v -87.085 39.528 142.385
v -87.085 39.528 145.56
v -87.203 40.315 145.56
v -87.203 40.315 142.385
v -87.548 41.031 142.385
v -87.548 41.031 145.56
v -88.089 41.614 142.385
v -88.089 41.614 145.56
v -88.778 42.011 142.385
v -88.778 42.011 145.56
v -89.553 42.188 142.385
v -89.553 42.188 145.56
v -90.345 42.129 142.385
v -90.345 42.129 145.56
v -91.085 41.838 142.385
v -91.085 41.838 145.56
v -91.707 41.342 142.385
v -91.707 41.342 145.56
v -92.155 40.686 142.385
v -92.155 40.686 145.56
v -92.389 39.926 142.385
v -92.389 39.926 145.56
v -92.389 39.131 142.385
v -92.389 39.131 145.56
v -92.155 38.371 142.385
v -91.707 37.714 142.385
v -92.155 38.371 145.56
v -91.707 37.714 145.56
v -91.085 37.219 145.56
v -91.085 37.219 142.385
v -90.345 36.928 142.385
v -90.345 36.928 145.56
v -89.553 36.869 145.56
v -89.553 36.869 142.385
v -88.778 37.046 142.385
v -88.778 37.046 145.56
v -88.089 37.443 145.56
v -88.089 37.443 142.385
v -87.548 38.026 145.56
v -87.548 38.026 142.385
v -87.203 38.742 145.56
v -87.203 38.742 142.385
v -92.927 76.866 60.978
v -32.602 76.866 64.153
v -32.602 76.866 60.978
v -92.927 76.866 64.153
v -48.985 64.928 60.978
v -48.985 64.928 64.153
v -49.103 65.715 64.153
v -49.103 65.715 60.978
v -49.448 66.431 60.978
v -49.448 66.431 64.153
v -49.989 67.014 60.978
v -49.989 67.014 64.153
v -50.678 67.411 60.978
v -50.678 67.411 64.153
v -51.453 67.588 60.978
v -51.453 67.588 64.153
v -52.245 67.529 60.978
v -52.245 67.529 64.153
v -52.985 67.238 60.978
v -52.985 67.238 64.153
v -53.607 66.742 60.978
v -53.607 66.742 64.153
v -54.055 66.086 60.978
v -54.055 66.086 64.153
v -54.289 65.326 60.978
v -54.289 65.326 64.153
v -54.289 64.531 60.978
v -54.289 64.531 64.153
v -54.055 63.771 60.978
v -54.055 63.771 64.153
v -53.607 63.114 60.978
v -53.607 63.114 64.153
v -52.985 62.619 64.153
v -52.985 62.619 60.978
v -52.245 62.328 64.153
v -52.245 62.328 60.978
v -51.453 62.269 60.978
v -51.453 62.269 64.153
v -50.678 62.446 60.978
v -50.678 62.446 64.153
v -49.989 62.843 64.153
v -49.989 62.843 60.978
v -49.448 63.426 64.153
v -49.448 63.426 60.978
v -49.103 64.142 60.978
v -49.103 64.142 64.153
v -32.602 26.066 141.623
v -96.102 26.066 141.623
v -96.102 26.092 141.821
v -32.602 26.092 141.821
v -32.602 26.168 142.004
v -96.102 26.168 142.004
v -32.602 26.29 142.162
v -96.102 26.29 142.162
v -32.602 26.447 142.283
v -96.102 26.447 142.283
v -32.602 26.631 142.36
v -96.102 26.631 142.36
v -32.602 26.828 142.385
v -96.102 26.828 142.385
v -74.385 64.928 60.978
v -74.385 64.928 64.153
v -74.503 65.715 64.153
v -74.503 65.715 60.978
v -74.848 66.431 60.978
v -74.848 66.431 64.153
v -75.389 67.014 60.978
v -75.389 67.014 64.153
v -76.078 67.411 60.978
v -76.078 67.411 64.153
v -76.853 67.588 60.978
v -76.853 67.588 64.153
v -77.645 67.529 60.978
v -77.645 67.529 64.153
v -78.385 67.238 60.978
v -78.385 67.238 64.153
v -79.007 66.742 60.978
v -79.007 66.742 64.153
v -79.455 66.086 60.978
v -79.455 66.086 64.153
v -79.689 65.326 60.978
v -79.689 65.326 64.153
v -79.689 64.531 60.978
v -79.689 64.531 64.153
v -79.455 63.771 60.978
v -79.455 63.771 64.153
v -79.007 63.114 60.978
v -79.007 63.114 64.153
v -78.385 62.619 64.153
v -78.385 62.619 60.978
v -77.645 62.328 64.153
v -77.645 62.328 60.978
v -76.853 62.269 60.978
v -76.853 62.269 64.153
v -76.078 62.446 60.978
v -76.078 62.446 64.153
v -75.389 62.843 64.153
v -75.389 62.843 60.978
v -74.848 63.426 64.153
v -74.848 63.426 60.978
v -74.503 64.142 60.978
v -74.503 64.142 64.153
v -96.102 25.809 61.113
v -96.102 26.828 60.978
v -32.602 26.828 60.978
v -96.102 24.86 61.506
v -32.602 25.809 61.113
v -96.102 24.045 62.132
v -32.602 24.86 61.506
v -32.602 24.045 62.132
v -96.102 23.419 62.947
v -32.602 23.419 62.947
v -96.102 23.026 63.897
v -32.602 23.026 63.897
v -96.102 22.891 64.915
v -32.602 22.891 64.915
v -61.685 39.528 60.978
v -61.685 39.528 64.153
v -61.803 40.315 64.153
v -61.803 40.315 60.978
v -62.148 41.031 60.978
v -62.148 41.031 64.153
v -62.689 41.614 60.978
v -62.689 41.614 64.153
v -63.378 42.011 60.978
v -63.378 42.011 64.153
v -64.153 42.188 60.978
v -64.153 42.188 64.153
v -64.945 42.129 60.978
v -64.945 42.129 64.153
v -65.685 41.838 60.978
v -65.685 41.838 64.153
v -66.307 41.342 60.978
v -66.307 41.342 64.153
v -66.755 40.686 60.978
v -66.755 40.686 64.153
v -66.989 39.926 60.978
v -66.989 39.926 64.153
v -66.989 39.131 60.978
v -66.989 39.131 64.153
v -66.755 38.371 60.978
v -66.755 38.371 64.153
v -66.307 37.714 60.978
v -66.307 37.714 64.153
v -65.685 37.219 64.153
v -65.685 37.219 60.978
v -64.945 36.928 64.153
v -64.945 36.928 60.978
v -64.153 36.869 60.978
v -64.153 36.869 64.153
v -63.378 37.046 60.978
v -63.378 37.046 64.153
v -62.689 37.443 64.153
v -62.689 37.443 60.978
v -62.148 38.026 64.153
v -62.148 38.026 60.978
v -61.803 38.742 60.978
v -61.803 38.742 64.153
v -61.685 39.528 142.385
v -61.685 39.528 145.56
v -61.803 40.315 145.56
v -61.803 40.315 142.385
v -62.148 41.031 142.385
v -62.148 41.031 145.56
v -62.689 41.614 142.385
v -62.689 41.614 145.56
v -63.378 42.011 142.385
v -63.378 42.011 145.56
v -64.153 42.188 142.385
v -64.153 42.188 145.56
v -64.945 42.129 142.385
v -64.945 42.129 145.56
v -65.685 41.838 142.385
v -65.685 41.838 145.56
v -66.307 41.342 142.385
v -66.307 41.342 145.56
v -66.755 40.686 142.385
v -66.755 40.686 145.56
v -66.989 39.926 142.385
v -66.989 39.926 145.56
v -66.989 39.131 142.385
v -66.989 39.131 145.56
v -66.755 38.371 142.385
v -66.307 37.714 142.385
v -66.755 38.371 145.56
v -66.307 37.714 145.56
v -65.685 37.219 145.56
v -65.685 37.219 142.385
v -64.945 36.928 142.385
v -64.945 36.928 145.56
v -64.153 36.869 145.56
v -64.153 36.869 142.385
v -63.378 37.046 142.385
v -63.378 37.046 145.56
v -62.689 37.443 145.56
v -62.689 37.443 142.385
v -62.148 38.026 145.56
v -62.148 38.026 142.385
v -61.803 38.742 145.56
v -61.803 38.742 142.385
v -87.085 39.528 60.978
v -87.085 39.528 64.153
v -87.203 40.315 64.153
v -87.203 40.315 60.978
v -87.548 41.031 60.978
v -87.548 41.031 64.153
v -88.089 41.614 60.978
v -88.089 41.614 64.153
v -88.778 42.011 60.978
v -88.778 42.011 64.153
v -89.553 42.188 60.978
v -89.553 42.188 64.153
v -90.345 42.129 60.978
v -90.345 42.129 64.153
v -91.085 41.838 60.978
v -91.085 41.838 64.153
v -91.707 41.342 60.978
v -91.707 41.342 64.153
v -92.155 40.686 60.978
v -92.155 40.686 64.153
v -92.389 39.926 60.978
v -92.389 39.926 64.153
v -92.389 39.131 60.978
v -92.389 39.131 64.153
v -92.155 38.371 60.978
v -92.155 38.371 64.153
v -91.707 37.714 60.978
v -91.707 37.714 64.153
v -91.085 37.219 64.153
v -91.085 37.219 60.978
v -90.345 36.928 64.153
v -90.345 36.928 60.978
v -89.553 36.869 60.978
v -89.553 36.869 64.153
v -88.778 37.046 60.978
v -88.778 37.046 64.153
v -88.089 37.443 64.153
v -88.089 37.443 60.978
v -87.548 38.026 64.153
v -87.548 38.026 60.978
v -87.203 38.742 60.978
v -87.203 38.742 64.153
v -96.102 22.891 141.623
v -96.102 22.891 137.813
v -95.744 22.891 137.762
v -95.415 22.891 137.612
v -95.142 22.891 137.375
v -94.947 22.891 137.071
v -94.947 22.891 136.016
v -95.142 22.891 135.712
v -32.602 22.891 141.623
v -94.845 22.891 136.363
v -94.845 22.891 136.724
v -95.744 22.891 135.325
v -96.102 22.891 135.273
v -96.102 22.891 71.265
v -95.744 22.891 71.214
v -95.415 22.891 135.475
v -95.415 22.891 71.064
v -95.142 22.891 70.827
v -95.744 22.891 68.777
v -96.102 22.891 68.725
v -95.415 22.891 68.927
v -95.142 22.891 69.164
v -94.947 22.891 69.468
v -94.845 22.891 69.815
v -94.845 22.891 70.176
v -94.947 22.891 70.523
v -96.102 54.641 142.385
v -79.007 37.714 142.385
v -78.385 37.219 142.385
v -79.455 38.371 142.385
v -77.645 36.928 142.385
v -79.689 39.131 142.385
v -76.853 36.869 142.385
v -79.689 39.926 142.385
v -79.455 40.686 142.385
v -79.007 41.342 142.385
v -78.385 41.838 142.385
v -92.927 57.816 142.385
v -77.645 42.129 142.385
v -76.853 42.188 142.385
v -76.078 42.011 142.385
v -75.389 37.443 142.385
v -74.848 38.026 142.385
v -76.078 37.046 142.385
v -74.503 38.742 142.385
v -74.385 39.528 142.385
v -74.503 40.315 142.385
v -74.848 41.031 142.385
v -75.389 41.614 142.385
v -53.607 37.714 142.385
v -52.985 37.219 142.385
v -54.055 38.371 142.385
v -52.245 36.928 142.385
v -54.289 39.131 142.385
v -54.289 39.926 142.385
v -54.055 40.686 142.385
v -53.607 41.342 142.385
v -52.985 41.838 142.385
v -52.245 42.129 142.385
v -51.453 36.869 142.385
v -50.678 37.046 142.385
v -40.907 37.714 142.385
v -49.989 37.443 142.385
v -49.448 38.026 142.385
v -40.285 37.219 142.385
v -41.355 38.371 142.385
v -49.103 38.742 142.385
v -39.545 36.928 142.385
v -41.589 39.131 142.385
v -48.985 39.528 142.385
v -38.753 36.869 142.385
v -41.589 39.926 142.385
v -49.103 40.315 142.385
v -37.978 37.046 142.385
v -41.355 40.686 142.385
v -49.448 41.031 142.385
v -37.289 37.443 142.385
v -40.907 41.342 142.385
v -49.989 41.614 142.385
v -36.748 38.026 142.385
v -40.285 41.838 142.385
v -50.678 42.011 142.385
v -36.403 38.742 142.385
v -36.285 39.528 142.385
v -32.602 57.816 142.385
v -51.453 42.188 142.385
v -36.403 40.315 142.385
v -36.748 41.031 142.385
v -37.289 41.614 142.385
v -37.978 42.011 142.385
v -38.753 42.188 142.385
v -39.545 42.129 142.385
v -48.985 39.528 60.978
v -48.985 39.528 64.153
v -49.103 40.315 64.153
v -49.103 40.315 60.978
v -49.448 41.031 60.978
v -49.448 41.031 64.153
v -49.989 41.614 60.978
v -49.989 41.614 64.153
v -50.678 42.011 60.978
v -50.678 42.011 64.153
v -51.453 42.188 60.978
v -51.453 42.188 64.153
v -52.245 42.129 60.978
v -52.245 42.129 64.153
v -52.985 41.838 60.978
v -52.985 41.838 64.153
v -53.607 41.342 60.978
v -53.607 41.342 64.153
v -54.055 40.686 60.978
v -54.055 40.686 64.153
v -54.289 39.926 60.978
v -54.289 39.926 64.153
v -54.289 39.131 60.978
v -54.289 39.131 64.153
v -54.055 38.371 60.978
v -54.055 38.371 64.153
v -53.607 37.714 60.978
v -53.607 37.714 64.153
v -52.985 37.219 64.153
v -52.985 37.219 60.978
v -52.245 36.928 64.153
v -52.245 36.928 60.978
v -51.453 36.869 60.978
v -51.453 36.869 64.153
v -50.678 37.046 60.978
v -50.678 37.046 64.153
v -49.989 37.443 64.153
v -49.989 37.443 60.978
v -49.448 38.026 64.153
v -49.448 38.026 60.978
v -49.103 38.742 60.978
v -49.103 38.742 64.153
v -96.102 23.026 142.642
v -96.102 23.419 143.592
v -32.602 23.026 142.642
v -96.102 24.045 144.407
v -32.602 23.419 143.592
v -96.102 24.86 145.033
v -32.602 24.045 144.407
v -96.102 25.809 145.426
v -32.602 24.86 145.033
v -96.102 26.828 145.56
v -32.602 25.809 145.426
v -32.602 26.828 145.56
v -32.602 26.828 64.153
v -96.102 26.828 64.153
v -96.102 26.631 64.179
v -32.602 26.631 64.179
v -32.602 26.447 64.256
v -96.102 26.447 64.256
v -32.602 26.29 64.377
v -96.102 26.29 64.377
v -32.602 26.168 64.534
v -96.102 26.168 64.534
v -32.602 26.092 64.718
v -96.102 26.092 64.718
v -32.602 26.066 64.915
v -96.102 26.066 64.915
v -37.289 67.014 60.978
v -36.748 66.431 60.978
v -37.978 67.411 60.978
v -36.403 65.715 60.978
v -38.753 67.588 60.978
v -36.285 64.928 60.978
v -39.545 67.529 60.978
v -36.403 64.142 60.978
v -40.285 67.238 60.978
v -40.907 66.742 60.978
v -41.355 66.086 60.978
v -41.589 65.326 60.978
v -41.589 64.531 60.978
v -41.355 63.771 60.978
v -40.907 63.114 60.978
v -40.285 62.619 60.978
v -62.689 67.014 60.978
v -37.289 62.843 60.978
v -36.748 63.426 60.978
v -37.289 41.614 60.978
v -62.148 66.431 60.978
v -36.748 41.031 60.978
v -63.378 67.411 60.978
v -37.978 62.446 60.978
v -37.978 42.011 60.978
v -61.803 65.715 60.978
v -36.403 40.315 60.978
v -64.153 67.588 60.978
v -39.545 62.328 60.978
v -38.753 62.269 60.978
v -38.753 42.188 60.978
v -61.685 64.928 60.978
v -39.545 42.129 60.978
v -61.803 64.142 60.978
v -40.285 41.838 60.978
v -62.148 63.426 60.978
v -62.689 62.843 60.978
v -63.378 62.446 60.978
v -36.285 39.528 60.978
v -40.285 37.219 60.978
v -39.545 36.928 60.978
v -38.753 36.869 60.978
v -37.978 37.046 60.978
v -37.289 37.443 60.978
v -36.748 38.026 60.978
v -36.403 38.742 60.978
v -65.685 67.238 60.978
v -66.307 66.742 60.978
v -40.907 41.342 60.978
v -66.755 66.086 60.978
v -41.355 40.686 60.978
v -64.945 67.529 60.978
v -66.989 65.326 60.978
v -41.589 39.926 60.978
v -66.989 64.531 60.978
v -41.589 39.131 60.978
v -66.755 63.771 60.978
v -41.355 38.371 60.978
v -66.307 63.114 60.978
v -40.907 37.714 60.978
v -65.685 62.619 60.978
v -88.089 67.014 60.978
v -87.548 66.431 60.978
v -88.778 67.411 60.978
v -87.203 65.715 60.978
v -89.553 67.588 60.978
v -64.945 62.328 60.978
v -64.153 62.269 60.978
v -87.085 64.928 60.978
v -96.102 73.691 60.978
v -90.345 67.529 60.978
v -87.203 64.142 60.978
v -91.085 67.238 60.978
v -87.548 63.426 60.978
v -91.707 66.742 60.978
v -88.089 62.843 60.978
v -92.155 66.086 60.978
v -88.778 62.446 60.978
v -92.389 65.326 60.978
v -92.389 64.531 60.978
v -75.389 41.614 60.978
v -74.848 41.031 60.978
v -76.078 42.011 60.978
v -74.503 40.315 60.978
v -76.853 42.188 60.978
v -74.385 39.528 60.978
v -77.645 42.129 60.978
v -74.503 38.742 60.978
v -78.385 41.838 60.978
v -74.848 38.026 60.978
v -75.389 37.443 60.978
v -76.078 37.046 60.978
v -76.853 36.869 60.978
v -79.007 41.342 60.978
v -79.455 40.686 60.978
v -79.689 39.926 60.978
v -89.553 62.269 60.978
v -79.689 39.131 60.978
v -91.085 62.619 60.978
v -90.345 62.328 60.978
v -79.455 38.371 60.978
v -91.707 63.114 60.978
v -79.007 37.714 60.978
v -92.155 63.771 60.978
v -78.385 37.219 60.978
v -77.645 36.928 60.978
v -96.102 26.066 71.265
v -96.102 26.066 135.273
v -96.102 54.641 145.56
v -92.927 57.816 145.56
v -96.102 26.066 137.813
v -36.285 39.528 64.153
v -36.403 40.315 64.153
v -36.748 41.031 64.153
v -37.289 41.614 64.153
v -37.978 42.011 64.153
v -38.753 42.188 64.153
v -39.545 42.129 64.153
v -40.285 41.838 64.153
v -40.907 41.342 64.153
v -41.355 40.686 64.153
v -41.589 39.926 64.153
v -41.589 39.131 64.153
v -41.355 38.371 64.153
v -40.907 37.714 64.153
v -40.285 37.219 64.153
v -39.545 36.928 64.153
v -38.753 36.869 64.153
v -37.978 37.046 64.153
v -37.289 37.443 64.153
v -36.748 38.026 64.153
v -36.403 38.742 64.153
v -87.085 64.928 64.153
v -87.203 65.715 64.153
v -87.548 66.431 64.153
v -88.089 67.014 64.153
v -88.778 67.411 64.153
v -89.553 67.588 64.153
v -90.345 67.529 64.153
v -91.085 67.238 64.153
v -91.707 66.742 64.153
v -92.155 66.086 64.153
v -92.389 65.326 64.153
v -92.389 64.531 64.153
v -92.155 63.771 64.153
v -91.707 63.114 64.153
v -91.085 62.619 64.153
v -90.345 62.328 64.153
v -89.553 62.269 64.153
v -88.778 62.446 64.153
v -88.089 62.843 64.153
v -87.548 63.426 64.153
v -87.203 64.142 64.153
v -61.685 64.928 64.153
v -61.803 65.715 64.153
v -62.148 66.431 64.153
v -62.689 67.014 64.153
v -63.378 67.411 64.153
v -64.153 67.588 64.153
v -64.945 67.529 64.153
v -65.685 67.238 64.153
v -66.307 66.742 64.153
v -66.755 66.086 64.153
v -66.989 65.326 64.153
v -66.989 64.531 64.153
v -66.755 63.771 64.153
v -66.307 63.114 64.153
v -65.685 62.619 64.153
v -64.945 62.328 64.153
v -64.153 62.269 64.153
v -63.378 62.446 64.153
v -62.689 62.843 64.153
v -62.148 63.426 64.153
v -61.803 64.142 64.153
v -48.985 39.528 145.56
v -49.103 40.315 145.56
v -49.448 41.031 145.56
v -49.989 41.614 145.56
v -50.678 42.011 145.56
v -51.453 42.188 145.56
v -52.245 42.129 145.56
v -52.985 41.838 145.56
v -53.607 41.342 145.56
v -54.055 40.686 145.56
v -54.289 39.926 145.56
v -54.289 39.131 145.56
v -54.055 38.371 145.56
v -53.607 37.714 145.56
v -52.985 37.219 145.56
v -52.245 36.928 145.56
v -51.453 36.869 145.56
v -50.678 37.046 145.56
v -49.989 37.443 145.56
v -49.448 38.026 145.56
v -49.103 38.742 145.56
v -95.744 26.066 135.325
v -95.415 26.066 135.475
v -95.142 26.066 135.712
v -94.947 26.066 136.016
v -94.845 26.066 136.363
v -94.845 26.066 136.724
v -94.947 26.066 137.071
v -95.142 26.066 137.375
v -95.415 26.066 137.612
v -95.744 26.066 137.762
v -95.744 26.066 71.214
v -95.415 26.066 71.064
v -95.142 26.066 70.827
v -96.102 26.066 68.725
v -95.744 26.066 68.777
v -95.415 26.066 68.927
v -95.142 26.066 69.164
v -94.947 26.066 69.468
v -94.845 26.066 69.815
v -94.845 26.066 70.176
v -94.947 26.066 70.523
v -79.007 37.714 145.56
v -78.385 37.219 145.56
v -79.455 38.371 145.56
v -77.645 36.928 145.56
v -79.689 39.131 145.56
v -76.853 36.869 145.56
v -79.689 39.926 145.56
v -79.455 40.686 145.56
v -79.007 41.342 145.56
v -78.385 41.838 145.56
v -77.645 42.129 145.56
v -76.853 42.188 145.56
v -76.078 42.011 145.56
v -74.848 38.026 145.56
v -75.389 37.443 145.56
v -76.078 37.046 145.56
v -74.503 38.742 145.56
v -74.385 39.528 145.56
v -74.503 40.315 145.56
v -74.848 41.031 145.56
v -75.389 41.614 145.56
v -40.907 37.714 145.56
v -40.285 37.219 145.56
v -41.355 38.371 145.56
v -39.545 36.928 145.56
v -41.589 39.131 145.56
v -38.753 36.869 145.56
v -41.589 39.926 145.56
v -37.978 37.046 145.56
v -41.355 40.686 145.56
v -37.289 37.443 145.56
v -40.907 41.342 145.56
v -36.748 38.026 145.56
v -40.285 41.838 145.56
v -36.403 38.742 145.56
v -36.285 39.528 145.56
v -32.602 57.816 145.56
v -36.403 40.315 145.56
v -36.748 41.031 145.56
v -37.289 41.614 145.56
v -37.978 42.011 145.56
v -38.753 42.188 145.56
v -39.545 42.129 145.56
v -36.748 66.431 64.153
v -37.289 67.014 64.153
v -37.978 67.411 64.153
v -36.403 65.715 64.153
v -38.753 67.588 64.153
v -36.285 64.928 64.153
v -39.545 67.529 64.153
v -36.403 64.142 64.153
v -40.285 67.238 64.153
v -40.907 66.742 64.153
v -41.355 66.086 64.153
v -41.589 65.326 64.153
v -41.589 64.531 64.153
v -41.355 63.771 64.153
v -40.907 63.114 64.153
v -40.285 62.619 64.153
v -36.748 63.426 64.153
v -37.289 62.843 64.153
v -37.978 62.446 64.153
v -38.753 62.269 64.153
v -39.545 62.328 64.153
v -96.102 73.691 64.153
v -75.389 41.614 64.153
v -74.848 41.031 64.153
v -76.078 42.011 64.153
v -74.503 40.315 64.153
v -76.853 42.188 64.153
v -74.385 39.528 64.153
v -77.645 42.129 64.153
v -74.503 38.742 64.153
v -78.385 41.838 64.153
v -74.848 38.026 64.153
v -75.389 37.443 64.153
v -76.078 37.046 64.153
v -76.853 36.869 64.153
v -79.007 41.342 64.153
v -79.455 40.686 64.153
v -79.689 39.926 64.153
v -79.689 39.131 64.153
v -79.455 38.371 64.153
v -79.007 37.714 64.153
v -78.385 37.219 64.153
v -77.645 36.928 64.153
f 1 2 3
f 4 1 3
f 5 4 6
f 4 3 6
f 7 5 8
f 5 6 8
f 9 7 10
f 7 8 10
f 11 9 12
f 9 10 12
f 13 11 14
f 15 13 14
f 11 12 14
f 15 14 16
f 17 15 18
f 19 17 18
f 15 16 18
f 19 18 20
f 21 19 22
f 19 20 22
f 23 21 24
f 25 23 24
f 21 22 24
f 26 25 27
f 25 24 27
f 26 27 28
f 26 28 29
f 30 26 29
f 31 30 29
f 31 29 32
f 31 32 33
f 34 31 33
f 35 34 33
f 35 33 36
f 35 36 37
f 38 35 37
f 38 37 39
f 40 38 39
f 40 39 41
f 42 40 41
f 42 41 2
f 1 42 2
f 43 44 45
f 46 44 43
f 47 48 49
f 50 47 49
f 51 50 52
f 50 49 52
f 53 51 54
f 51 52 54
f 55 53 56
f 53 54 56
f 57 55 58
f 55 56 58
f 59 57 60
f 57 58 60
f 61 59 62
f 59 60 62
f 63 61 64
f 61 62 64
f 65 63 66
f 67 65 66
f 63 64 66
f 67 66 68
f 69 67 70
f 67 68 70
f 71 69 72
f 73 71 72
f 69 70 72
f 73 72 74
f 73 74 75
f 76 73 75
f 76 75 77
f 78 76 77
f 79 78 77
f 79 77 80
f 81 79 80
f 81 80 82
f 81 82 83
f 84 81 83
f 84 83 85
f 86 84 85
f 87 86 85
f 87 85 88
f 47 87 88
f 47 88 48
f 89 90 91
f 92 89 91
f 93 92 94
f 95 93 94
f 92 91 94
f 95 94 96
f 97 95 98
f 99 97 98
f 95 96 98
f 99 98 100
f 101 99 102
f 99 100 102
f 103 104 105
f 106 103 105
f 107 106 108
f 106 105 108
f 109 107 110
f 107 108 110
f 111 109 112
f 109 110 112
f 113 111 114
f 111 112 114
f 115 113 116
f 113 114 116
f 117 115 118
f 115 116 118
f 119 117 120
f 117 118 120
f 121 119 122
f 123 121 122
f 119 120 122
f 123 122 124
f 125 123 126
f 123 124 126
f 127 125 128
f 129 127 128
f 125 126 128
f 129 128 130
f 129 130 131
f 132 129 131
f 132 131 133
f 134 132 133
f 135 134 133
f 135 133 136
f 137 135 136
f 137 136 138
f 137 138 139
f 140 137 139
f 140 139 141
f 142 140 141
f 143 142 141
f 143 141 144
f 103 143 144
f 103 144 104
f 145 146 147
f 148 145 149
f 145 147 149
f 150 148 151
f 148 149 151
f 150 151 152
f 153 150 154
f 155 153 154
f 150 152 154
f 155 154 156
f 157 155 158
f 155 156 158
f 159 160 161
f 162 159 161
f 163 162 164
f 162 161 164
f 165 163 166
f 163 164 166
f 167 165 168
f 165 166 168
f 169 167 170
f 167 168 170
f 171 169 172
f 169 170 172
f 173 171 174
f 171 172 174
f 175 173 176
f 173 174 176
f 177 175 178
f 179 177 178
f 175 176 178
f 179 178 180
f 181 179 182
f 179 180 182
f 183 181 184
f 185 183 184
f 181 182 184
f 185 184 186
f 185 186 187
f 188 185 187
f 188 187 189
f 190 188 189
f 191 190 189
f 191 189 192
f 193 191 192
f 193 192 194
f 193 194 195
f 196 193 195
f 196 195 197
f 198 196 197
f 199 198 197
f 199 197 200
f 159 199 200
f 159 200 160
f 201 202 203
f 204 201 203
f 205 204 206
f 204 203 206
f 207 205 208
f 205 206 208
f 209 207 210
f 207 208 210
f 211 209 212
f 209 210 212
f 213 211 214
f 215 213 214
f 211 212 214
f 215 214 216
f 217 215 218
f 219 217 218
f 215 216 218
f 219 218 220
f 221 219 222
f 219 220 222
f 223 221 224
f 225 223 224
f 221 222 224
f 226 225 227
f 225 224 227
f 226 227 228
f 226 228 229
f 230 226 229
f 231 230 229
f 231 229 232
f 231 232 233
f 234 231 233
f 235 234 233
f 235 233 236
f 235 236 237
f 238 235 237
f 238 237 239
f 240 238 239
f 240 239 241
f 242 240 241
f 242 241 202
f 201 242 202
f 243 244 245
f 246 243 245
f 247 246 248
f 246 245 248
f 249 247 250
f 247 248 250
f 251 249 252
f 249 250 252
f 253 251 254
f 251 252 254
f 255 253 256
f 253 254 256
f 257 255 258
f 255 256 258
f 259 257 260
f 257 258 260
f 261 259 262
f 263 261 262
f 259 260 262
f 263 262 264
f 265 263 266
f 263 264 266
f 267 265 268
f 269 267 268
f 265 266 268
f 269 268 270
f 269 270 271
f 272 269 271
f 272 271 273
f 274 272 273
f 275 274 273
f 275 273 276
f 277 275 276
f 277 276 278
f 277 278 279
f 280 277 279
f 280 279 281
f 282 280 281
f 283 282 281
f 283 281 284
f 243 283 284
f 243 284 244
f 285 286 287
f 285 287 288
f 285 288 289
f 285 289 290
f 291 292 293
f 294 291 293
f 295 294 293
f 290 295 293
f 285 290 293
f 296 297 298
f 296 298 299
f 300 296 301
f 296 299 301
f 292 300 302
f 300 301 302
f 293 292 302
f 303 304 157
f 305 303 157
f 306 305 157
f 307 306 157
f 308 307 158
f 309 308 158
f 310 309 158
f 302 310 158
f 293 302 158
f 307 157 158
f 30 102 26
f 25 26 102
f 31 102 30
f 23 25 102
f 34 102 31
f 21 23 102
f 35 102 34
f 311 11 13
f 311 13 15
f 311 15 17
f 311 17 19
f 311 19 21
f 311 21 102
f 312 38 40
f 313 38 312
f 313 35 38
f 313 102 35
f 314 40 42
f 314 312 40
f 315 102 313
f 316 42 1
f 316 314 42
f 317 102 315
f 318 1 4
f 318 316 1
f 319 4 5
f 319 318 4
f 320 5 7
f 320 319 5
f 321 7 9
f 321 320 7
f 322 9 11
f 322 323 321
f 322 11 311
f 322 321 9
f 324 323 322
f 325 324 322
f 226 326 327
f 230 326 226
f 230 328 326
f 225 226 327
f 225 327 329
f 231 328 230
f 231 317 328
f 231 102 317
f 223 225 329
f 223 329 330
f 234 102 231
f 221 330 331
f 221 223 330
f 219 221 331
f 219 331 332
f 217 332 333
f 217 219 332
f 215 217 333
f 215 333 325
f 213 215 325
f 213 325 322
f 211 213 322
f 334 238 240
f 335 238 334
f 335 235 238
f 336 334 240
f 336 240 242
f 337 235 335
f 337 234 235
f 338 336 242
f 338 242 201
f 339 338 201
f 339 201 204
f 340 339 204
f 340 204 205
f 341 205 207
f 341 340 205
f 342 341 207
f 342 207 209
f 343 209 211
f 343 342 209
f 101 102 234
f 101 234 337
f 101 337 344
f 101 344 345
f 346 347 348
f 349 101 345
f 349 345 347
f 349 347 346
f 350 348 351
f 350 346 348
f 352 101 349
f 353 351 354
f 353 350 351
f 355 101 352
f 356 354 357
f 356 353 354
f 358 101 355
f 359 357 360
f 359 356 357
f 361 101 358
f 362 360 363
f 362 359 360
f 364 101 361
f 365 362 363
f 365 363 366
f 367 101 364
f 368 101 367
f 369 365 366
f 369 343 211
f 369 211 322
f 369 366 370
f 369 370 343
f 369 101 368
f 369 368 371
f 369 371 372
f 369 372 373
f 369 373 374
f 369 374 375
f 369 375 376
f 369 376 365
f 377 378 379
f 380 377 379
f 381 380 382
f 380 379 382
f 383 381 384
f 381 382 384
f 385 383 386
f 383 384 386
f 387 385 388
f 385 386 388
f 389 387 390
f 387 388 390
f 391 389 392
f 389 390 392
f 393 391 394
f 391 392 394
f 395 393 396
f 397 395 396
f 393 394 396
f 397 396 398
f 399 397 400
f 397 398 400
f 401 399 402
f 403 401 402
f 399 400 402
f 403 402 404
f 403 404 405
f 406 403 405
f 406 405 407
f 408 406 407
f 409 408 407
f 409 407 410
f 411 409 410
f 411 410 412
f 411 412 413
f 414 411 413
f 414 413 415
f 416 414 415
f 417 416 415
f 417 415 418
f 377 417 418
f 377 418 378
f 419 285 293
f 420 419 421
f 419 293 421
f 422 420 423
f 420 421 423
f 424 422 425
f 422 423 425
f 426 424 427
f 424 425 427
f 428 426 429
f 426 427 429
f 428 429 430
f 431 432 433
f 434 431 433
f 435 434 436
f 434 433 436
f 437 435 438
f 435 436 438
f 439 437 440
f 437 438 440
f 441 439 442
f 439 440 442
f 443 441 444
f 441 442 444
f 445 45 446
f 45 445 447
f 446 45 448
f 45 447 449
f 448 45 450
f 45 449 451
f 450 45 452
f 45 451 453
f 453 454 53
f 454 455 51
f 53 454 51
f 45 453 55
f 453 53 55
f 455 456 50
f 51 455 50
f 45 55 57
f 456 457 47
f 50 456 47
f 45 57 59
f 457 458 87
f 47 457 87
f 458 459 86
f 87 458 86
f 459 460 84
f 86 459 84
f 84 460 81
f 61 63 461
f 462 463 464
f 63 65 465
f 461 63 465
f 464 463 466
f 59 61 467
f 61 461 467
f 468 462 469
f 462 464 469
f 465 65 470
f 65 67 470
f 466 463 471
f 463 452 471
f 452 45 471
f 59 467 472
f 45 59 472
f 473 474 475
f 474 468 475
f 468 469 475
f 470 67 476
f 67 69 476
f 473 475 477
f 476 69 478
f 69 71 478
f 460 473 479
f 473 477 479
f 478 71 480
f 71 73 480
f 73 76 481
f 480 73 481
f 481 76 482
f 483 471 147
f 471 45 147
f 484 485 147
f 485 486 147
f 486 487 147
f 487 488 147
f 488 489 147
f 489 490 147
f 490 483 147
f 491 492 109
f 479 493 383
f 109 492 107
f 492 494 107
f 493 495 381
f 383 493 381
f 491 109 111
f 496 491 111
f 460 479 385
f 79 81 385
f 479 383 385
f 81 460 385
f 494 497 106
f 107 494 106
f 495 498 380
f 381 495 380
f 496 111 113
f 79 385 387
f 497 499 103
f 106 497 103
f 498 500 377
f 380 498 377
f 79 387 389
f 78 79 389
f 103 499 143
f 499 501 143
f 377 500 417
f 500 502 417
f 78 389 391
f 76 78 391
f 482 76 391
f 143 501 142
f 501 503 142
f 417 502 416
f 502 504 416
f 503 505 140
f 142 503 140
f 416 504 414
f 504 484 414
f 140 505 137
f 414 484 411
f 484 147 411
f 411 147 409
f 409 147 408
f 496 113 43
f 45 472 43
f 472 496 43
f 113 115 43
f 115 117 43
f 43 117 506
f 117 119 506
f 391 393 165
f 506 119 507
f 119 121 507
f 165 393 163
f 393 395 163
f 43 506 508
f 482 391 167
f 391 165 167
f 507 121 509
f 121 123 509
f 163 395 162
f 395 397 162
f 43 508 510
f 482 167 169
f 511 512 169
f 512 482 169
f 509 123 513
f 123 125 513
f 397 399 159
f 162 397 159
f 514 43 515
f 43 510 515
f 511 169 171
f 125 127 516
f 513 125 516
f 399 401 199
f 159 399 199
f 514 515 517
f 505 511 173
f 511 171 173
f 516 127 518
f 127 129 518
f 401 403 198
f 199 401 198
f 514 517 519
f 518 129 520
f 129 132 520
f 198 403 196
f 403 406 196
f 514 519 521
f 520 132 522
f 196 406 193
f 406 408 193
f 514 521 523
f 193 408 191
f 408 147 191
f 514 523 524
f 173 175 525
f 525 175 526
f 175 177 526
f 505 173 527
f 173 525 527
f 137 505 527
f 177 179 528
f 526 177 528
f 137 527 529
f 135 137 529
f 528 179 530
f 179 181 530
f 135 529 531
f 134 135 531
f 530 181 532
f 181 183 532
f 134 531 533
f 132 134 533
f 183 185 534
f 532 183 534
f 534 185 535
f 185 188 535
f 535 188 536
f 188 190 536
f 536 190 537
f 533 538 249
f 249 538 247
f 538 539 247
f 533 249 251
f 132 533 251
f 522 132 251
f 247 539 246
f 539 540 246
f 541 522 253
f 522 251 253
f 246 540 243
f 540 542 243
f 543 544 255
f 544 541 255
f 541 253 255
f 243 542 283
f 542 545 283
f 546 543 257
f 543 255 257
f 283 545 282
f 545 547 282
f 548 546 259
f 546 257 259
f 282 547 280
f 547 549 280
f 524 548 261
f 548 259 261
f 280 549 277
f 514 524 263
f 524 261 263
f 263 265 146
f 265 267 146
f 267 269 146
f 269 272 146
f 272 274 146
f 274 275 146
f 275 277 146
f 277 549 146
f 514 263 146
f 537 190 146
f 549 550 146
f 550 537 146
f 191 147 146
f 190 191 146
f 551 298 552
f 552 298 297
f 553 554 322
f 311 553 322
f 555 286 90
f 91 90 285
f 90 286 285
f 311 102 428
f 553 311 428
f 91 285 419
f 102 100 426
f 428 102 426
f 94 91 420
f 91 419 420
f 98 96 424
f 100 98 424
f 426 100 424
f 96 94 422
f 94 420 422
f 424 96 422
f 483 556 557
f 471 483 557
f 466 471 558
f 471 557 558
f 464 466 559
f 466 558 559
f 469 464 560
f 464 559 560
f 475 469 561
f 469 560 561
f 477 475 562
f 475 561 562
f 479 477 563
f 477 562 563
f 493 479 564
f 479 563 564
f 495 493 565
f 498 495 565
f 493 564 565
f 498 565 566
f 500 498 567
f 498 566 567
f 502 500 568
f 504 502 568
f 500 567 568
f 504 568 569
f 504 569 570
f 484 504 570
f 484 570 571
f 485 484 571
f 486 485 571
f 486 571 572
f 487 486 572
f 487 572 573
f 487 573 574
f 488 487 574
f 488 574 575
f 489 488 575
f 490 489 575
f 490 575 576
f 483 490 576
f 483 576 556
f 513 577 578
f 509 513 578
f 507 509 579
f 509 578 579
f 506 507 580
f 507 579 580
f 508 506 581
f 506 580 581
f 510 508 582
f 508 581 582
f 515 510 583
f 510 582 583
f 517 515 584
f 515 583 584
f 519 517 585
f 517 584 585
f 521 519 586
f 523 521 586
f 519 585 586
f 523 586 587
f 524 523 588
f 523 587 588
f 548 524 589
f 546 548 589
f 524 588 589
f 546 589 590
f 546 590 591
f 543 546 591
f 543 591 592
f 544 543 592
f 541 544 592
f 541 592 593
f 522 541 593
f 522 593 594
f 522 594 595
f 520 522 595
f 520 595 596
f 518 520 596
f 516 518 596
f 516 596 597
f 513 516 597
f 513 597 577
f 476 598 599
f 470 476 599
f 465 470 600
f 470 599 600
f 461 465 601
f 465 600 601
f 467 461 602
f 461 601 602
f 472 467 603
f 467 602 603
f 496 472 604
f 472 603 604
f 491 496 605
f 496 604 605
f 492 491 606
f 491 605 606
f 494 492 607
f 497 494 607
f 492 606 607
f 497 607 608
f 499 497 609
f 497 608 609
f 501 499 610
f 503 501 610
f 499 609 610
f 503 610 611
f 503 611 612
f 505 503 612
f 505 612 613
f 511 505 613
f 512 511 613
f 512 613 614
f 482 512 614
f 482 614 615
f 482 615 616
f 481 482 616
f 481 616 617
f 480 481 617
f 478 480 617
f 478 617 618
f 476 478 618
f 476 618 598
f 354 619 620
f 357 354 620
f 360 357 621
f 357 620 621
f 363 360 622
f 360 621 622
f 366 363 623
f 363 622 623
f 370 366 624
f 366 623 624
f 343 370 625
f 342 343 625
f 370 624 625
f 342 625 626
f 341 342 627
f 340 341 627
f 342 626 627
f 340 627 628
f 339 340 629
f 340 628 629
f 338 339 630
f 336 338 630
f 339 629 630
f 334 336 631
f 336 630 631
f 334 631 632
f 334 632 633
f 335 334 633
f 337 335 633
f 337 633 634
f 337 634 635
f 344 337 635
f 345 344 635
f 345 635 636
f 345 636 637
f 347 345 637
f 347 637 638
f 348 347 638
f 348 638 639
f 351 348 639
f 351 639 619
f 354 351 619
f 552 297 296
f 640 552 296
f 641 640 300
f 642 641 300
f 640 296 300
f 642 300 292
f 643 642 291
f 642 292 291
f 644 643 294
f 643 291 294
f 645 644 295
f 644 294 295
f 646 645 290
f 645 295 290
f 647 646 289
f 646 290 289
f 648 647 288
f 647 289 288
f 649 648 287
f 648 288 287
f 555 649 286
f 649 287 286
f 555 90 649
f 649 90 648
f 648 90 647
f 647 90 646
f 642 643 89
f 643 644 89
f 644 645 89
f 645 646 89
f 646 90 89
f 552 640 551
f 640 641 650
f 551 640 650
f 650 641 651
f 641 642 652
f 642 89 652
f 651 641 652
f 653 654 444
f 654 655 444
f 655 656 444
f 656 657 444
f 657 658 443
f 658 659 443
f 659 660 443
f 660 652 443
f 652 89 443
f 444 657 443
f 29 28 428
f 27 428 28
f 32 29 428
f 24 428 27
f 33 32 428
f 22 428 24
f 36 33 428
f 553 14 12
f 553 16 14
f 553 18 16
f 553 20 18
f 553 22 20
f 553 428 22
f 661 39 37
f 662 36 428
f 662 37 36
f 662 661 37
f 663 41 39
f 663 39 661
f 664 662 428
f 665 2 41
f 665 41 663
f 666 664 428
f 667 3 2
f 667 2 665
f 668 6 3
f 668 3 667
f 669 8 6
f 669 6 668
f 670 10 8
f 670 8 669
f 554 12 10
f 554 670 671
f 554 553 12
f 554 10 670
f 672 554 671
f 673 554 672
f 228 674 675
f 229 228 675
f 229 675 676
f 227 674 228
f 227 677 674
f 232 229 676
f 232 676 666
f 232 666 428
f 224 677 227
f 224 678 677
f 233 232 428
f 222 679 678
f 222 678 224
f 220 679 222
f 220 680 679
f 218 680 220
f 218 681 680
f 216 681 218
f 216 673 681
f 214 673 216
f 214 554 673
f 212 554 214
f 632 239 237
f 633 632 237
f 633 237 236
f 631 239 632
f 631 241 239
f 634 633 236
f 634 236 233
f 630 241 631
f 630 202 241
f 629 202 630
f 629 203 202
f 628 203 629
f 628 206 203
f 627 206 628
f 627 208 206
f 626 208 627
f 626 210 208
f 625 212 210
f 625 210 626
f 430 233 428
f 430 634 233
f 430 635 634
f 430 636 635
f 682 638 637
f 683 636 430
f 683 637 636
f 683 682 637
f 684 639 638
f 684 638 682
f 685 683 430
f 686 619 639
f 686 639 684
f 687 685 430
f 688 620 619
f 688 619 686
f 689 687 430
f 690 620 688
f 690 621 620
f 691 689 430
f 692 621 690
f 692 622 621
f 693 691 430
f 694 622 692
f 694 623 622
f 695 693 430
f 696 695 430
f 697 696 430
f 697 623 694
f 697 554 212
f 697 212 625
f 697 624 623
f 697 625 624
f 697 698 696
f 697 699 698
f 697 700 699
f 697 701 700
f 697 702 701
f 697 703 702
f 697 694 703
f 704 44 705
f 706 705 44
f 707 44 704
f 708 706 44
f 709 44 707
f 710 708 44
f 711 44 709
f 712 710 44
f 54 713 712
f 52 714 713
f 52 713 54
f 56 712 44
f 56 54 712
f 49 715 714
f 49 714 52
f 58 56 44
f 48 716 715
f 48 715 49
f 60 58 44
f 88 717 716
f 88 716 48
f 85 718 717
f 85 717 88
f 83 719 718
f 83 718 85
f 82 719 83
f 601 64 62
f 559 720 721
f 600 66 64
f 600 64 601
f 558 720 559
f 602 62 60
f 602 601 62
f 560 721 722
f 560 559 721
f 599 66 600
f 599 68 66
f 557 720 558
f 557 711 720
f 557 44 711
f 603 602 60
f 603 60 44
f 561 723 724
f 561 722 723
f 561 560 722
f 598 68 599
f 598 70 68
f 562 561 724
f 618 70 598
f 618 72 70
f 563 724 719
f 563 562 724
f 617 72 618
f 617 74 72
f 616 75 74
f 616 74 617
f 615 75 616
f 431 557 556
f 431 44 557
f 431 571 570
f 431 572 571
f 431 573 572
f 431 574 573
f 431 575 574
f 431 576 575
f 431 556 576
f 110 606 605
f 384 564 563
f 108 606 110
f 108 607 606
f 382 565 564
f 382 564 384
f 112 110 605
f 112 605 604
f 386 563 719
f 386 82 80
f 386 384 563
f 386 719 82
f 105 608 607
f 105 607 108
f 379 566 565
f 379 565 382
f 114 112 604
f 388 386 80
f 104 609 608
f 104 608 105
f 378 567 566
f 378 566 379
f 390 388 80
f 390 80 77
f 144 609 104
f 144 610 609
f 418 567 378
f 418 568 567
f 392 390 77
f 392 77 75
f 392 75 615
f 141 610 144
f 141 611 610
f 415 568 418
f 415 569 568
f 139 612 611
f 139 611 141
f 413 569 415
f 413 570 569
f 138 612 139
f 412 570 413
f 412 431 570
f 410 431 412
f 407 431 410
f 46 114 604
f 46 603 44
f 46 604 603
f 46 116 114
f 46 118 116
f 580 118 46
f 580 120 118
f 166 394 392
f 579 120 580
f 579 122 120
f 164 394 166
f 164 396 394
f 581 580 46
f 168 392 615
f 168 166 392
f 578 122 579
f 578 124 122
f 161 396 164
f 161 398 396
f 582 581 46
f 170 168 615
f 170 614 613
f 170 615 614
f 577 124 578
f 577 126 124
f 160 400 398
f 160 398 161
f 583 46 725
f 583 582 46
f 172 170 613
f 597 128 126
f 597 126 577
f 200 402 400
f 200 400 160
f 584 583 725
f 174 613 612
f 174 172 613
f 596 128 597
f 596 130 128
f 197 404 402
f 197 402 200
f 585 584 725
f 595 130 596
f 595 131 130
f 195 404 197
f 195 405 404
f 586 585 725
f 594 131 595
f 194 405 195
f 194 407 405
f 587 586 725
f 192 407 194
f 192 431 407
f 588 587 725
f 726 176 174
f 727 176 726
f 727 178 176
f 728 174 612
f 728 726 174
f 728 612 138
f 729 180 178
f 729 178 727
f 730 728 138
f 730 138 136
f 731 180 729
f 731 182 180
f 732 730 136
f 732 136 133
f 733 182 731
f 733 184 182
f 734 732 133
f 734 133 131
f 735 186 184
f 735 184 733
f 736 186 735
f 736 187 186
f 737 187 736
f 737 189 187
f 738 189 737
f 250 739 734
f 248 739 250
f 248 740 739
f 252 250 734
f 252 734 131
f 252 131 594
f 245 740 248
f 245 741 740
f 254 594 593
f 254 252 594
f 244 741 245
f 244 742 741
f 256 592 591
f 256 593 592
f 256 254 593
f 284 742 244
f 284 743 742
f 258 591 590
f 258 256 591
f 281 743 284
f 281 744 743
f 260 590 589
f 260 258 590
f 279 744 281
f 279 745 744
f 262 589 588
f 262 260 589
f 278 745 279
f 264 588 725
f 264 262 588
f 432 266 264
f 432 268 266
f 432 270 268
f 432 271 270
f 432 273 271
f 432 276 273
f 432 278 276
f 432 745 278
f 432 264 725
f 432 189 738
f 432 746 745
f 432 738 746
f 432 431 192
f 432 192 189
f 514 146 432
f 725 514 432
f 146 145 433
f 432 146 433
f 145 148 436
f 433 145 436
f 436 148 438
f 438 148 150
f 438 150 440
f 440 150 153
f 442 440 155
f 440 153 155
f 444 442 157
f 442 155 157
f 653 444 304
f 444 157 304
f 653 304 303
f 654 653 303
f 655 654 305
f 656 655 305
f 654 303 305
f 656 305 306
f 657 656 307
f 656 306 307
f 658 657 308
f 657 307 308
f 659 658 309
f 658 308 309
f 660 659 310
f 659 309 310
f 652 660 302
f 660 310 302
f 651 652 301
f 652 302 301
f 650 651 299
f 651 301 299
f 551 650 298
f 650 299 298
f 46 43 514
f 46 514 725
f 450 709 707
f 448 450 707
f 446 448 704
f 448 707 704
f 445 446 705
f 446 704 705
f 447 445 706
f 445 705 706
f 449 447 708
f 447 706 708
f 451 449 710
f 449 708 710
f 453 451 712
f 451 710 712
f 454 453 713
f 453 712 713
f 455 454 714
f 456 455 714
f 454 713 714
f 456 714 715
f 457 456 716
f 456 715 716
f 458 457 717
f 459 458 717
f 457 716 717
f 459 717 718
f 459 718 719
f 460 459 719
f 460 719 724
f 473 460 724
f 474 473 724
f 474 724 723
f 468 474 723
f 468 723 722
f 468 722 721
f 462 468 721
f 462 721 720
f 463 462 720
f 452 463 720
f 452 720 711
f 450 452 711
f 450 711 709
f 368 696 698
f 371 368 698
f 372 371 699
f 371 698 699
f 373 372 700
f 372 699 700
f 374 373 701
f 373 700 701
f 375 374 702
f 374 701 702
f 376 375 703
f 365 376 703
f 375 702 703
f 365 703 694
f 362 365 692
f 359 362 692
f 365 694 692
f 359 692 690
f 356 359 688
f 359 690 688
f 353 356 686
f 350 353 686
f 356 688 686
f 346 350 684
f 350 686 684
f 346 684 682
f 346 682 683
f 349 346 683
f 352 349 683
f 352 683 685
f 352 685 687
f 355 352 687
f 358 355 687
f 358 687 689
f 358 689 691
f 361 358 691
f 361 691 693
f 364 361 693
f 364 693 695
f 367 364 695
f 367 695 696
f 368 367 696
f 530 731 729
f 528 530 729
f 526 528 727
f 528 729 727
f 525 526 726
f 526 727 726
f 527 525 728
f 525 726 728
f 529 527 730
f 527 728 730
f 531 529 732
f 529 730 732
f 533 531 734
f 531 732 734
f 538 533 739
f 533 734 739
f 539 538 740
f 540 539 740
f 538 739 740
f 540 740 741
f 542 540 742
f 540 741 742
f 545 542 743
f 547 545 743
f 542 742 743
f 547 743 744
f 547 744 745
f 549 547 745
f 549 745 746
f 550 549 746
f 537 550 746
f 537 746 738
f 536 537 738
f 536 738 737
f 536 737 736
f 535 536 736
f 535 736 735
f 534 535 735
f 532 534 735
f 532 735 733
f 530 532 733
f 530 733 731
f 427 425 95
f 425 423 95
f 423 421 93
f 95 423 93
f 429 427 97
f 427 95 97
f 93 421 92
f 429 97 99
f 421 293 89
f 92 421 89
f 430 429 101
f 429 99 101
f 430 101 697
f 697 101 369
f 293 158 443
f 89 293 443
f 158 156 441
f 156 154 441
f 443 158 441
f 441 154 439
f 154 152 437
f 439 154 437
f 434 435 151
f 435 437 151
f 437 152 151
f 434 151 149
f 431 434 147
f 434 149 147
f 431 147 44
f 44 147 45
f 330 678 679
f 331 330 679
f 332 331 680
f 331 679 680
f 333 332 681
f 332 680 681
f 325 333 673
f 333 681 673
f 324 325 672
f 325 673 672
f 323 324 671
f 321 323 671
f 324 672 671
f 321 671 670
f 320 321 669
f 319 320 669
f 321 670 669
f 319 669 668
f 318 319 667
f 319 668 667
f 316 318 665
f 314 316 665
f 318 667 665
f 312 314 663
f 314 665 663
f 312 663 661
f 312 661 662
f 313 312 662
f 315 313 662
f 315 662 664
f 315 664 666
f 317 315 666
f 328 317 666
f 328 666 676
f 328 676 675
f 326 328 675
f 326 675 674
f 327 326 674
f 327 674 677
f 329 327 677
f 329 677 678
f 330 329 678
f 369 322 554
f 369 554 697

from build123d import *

# Parameters (mm, degrees)
SKETCH1_W            = 698.5
SKETCH1_H            = 84.582
BOSS_EXTRUDE1_DEPTH  = 34.925
SKETCH2_W            = 81.407
SKETCH2_H            = 31.75
CUT_EXTRUDE1_DEPTH   = 699.5
SKETCH3_W            = 698.5
SKETCH3_H            = 3.175
BOSS_EXTRUDE2_DEPTH  = 50.8
M2_CLEARANCE_HOLE1_D = 2.54
M5_CLEARANCE_HOLE1_D = 5.334
CHAMFER1_SIZE        = 3.175
FILLET1_R            = 0.762
FILLET2_R            = 3.937
SKETCH8_W            = 725.924928317
SKETCH8_H            = 218.216354959
CUT_EXTRUDE2_DEPTH   = 85.582


with BuildPart() as part:
    # Sketch1 → Boss-Extrude1 (new body)
    with BuildSketch(Plane(origin=(0, 57.816398039, 0), x_dir=(1, 0, 0), z_dir=(0, 1, 0))):
        with Locations((253.148031467, -103.269491579)):
            Rectangle(SKETCH1_W, SKETCH1_H)
    extrude(amount=-BOSS_EXTRUDE1_DEPTH)

    # Sketch2 → Cut-Extrude1 (cut, through all)
    with BuildSketch(Plane(origin=(602.398031467, 0, 0), x_dir=(0, 0, -1), z_dir=(1, 0, 0))):
        with Locations((-101.681991579, 41.941398039)):
            Rectangle(SKETCH2_W, SKETCH2_H)
    extrude(amount=-CUT_EXTRUDE1_DEPTH, mode=Mode.SUBTRACT)

    # Sketch3 → Boss-Extrude2 (add)
    with BuildSketch(Plane(origin=(0, 26.066398039, 0), x_dir=(-1, 0, 0), z_dir=(0, 1, 0))):
        with Locations((-253.148031467, 62.565991579)):
            Rectangle(SKETCH3_W, SKETCH3_H)
    extrude(amount=BOSS_EXTRUDE2_DEPTH)

    # M2 Clearance Hole1 (through all)
    with Locations(Plane(origin=(0, 26.066398039, 0), x_dir=(1, 0, 0), z_dir=(0, 1, 0))):
        with Locations((-96.101968533, -136.543491579), (-96.101968533, -69.995491579)):
            Hole(M2_CLEARANCE_HOLE1_D / 2)

    # M5 Clearance Hole1 (through all)
    with Locations(Plane(origin=(0, 0, 60.978491579), x_dir=(-1, 0, 0), z_dir=(0, 0, -1))):
        with Locations((-469.048031467, 64.928398039), (-481.748031467, 64.928398039), (-469.048031467, 39.528398039), (-481.748031467, 39.528398039), (-456.348031467, 39.528398039), (-443.648031467, 39.528398039), (-430.948031467, 39.528398039), (-418.248031467, 39.528398039), (-405.548031467, 39.528398039), (-392.848031467, 39.528398039), (-380.148031467, 39.528398039), (-367.448031467, 39.528398039), (-354.748031467, 39.528398039), (-342.048031467, 39.528398039), (-329.348031467, 39.528398039), (-316.648031467, 39.528398039), (-303.948031467, 39.528398039), (-291.248031467, 39.528398039), (-278.548031467, 39.528398039), (-265.848031467, 39.528398039), (-253.148031467, 39.528398039), (-240.448031467, 39.528398039), (-227.748031467, 39.528398039), (-215.048031467, 39.528398039), (-202.348031467, 39.528398039), (-189.648031467, 39.528398039), (-176.948031467, 39.528398039), (-164.248031467, 39.528398039), (-151.548031467, 39.528398039), (-138.848031467, 39.528398039), (-126.148031467, 39.528398039), (-113.448031467, 39.528398039), (-100.748031467, 39.528398039), (-88.048031467, 39.528398039), (-75.348031467, 39.528398039), (-62.648031467, 39.528398039), (-49.948031467, 39.528398039), (-37.248031467, 39.528398039), (-24.548031467, 39.528398039), (-11.848031467, 39.528398039), (0.851968533, 39.528398039), (13.551968533, 39.528398039), (26.251968533, 39.528398039), (38.951968533, 39.528398039), (51.651968533, 39.528398039), (64.351968533, 39.528398039), (77.051968533, 39.528398039), (89.751968533, 39.528398039), (-456.348031467, 64.928398039), (-443.648031467, 64.928398039), (-430.948031467, 64.928398039), (-418.248031467, 64.928398039), (-405.548031467, 64.928398039), (-392.848031467, 64.928398039), (-380.148031467, 64.928398039), (-367.448031467, 64.928398039), (-354.748031467, 64.928398039), (-342.048031467, 64.928398039), (-329.348031467, 64.928398039), (-316.648031467, 64.928398039), (-303.948031467, 64.928398039), (-291.248031467, 64.928398039), (-278.548031467, 64.928398039), (-265.848031467, 64.928398039), (-253.148031467, 64.928398039), (-240.448031467, 64.928398039), (-227.748031467, 64.928398039), (-215.048031467, 64.928398039), (-202.348031467, 64.928398039), (-189.648031467, 64.928398039), (-176.948031467, 64.928398039), (-164.248031467, 64.928398039), (-151.548031467, 64.928398039), (-138.848031467, 64.928398039), (-126.148031467, 64.928398039), (-113.448031467, 64.928398039), (-100.748031467, 64.928398039), (-88.048031467, 64.928398039), (-75.348031467, 64.928398039), (-62.648031467, 64.928398039), (-49.948031467, 64.928398039), (-37.248031467, 64.928398039), (-24.548031467, 64.928398039), (-11.848031467, 64.928398039), (0.851968533, 64.928398039), (13.551968533, 64.928398039), (26.251968533, 64.928398039), (38.951968533, 64.928398039), (51.651968533, 64.928398039), (64.351968533, 64.928398039), (77.051968533, 64.928398039), (89.751968533, 64.928398039), (-494.448031467, 64.928398039), (-494.448031467, 39.528398039), (-507.148031467, 64.928398039), (-507.148031467, 39.528398039), (-519.848031467, 64.928398039), (-519.848031467, 39.528398039), (-532.548031467, 64.928398039), (-532.548031467, 39.528398039), (-545.248031467, 64.928398039), (-545.248031467, 39.528398039), (-557.948031467, 64.928398039), (-557.948031467, 39.528398039), (-570.648031467, 64.928398039), (-570.648031467, 39.528398039), (-583.348031467, 64.928398039), (-583.348031467, 39.528398039), (-596.048031467, 64.928398039), (-596.048031467, 39.528398039)):
            Hole(M5_CLEARANCE_HOLE1_D / 2)

    # Chamfer1
    chamfer1_edges = [part.edges().sort_by_distance(p)[0] for p in [
        (-96.101968533, 57.816398039, 143.972991579),
        (-96.101968533, 76.866398039, 62.565991579),
        (602.398031467, 76.866398039, 62.565991579),
        (602.398031467, 57.816398039, 143.972991579),
    ]]
    chamfer(chamfer1_edges, length=CHAMFER1_SIZE)

    # Fillet1
    fillet1_edges = [part.edges().sort_by_distance(p)[0] for p in [
        (253.148031467, 26.066398039, 142.385491579),
        (253.148031467, 26.066398039, 64.153491579),
    ]]
    fillet(fillet1_edges, radius=FILLET1_R)

    # Fillet2
    fillet2_edges = [part.edges().sort_by_distance(p)[0] for p in [
        (253.148031467, 22.891398039, 60.978491579),
        (253.148031467, 22.891398039, 145.560491579),
    ]]
    fillet(fillet2_edges, radius=FILLET2_R)

    # Sketch8 → Cut-Extrude2 (cut, through all)
    with BuildSketch(Plane(origin=(0, 0, 60.978491579), x_dir=(-1, 0, 0), z_dir=(0, 0, -1))):
        with Locations((-330.360495626, 61.250645378)):
            Rectangle(SKETCH8_W, SKETCH8_H)
    extrude(amount=-CUT_EXTRUDE2_DEPTH, mode=Mode.SUBTRACT)


solid = part.part
